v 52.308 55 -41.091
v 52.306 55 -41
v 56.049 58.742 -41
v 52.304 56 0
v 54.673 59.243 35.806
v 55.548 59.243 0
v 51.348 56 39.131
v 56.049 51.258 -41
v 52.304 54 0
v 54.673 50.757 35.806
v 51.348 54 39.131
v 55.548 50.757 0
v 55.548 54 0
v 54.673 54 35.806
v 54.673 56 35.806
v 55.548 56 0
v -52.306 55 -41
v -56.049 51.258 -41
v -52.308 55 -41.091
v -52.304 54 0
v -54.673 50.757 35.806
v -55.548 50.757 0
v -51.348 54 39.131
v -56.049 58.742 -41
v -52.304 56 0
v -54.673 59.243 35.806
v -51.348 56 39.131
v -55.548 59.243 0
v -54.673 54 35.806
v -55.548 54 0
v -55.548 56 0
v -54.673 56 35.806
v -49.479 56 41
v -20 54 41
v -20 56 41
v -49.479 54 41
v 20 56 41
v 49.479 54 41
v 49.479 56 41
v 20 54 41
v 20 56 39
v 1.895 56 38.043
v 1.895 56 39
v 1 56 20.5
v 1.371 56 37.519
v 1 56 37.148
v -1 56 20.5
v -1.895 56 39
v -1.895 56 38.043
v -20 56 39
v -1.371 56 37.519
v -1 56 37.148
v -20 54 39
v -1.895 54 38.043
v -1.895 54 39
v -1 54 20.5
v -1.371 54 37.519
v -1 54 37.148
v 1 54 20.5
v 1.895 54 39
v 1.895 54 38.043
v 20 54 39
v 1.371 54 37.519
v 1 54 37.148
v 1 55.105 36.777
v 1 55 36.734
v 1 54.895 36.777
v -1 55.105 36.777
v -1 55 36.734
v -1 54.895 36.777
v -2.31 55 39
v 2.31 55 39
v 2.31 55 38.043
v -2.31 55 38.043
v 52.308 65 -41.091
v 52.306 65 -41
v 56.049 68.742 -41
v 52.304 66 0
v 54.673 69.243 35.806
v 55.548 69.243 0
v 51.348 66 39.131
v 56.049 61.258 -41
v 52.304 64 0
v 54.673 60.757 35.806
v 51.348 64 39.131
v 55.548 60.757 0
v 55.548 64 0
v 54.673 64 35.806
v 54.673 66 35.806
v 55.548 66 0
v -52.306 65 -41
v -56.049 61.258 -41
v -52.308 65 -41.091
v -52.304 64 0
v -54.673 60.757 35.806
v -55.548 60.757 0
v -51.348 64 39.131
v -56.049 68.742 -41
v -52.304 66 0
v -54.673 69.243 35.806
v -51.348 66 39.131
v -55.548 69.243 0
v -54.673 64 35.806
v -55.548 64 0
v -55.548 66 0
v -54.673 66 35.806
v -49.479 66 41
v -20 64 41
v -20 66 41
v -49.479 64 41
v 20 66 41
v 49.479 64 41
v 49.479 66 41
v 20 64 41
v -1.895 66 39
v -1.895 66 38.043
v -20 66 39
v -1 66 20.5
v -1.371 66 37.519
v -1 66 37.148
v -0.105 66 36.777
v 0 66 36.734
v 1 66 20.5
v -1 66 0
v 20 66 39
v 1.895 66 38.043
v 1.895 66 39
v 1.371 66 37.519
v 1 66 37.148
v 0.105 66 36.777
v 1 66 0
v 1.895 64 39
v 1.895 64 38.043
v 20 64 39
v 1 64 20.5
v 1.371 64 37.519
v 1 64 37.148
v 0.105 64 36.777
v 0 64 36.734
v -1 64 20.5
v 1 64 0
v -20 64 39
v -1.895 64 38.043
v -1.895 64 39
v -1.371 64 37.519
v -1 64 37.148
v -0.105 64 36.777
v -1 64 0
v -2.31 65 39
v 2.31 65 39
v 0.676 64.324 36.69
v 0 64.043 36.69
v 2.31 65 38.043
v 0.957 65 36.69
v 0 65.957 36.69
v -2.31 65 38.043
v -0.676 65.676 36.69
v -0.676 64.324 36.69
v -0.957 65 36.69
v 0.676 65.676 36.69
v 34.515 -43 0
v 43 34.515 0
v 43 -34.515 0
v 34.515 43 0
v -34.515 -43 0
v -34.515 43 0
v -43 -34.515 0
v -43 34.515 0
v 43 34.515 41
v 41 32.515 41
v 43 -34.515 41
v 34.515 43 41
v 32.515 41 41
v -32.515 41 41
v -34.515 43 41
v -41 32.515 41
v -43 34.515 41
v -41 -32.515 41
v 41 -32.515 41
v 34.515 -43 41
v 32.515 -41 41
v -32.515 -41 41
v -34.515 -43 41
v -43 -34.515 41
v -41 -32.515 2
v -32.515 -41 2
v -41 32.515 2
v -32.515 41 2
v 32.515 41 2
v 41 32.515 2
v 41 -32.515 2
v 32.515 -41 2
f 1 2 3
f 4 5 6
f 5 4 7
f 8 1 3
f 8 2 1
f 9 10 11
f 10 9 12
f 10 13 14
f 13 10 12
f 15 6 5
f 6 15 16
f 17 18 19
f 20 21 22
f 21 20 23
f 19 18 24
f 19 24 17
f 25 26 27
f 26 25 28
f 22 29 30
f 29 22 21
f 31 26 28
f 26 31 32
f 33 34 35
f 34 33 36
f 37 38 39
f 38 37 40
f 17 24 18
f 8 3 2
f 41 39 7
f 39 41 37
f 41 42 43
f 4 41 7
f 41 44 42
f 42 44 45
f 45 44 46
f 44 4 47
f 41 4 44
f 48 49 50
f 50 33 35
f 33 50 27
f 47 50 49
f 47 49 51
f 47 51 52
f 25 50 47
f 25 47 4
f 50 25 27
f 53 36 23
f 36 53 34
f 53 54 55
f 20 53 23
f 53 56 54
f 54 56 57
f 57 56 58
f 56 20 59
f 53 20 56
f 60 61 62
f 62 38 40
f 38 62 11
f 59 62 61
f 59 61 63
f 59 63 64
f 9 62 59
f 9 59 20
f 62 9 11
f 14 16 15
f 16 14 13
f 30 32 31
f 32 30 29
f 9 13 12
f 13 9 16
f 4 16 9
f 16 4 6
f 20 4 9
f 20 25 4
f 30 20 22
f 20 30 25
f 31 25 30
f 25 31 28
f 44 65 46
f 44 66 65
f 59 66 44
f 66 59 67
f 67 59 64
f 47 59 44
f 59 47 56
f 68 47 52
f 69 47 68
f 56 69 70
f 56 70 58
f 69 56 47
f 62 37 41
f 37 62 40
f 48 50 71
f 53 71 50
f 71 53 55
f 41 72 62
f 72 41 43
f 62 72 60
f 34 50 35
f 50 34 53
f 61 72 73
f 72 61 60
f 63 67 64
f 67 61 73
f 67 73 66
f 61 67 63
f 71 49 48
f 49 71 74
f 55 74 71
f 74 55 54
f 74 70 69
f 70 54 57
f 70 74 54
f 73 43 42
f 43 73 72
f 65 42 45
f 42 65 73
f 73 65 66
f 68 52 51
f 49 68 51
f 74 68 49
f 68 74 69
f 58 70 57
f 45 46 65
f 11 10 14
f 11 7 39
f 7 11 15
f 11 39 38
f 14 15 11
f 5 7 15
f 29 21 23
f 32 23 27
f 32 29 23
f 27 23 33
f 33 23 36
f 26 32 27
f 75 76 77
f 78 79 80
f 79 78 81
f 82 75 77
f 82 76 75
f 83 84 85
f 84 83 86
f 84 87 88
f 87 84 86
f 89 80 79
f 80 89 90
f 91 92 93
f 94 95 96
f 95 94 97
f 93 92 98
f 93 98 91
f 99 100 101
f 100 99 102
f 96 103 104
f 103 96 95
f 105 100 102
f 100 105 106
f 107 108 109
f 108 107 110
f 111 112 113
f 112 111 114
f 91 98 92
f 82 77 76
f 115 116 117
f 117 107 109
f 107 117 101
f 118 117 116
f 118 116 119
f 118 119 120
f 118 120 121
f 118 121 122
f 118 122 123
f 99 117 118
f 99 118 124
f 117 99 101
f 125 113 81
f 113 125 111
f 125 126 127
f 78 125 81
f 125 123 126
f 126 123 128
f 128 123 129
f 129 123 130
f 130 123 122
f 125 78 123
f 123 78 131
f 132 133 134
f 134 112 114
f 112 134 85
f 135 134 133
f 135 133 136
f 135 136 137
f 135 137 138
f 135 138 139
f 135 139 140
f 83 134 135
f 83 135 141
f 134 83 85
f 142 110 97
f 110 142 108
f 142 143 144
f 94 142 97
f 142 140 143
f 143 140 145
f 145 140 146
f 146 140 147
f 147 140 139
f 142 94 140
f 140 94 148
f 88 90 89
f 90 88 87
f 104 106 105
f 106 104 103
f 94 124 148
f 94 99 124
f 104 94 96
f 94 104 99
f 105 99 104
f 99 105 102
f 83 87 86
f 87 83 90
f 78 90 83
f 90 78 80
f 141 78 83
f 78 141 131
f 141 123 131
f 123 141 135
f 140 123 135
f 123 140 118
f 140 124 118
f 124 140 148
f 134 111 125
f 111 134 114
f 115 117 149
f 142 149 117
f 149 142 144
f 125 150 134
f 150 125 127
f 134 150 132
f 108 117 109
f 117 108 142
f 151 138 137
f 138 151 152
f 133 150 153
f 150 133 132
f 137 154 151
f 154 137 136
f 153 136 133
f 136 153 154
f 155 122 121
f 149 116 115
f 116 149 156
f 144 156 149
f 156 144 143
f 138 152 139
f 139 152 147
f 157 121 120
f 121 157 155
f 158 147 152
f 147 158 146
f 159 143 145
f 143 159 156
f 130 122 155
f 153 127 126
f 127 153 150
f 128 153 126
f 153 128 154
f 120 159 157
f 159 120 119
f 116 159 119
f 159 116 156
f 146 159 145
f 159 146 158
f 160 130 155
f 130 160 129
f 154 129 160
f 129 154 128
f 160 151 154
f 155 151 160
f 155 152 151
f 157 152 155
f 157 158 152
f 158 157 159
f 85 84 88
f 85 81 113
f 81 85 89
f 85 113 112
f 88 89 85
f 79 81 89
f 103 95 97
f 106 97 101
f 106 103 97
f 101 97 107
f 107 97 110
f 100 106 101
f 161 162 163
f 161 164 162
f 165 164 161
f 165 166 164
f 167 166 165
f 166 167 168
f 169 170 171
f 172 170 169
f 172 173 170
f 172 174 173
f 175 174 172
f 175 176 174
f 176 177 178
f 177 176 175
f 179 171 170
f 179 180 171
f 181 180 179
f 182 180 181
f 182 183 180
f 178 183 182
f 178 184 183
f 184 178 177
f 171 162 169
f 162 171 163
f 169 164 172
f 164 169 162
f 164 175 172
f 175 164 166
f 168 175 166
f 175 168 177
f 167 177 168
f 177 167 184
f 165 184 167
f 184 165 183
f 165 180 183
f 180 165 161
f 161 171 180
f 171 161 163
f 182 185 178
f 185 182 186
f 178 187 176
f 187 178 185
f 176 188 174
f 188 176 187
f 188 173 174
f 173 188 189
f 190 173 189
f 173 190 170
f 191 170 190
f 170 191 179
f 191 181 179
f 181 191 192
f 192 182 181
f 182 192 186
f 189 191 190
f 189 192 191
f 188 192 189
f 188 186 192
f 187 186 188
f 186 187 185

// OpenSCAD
// file: regular-square-bin.scad
// The length of the individual bin/tray.
$length = 86;

// The depth (width really) of the bin/tray.
$depth = 86;

// The height as a percentage of the total available depth of the bin it will be inserted into.
$heightPct = 50; // [20:100]

// The thickness of the outter walls.
$wallThickness = 2; // [2:10]

// The thickness of the bottom.
$bottomThickness = 2; // [2:10]

// The chamfer size on the left side of the box.
$leftChamfer = 12; // [0:14]

// The chamfer size on the right side of the box.
$rightChamfer = 12; // [0:14]

{} // Below this are not customizable parameters

generateTrayPct($length, $depth, $heightPct, $wallThickness, $bottomThickness, $leftChamfer, $rightChamfer);

module generateTrayPct(length, depth, heightPct, wallThickness, bottomThickness, leftChamfer, rightChamfer) {
    $height = 82 * heightPct * 0.01;
    generateTray(length, depth, $height, wallThickness, bottomThickness, leftChamfer, rightChamfer);
}

module generateTray(length, depth, height, wallThickness, bottomThickness, leftChamfer, rightChamfer) {
    $leftChamferTriangleSide = sqrt(pow(leftChamfer,2)/2);
    $rightChamferTriangleSide = sqrt(pow(rightChamfer,2)/2);

    // Outer polygon
    outer_points = [
        [$leftChamferTriangleSide,0], 
        [length-$rightChamferTriangleSide,0], 
        [length, $rightChamferTriangleSide],
        [length, depth-$rightChamferTriangleSide],
        [length - $rightChamferTriangleSide, depth],
        [$leftChamferTriangleSide,depth],
        [0,depth-$leftChamferTriangleSide],
        [0, $leftChamferTriangleSide]
    ];

    // Inner polygon
    inner_points = [
        [$leftChamferTriangleSide + wallThickness, wallThickness], 
        [length - $rightChamferTriangleSide - wallThickness, wallThickness], 
        [length - wallThickness, $rightChamferTriangleSide + wallThickness],
        [length - wallThickness, depth - $rightChamferTriangleSide - wallThickness],
        [length - $rightChamferTriangleSide - wallThickness, depth - wallThickness],
        [$leftChamferTriangleSide + wallThickness, depth - wallThickness],
        [wallThickness, depth - $leftChamferTriangleSide - wallThickness],
        [wallThickness, $leftChamferTriangleSide + wallThickness]
    ];

    // Create the hollow shape and extrude it
    color("green")
    linear_extrude(height = height)
    difference() {
            polygon(points = outer_points);
            polygon(points = inner_points);
    }

    // Add a solid base
    color("red")
    linear_extrude(height = bottomThickness)
    polygon(points = outer_points);
}
// file: regular-square-divider.scad
// Length of the Divider ... Regular 4" Square, X-Style: 113mm was a tad loose, 114mm was too tight, 113.5 fits but is a tad tight.
$lengthAtTop = 113.25;

// Thickness of the Divider
$thickness = 2; // [2:10]

// The proportion of the total height to use for scaling.
$heightPercentage = 100; // [10:100]

// Width of the Divider Edge
$widthOfDividerEdge = 6; // [6:10]

// The Length of the Chamfer
$chamferLength = 10; // [6:14]

// Cutout Location for connecting dividers together
$cutOutLocation = 1; // [1:Bottom, -1:Top, 0:None]

// Width of the notch at the bottom of the divider
$bottomNotchWidth = 40; // [25:50]
    
{} // All Parameters Above

// Object Generation
/////////////////////////////////////////////////
GenerateDivider($lengthAtTop, $thickness, $heightPercentage, $widthOfDividerEdge, $chamferLength, $cutOutLocation, $bottomNotchWidth);

// Generate the Divider
/////////////////////////////////////////////////
module GenerateDivider(lengthAtTop, thickness, heightPercentage, widthOfDividerEdge, chamferLength, cutOutLocation, bottomNotchWidth) {

    // THe Height of the Divider
    $height = 82;

    // The height (or depth) of the notch at the bottom of the divider
    $bottomNotchHeight = 2; // [0:10]

    // Angle of the Container Sides
    $complementAngle = 1.4;
    $angle = 90 - $complementAngle;

    difference() {
        IsoTrapezoid(lengthAtTop, $height, $angle, thickness, widthOfDividerEdge);
        
        $heightProportion = heightPercentage * .01;
        
        $precentageToRemove = (1 - $heightProportion);
        
        // Cut from the Top Down
        $amountToRemoveFromTop = $height * $precentageToRemove;
        $topEdgeFromCenter = -$height / 2;
        translate([0, 0, $topEdgeFromCenter + $amountToRemoveFromTop / 2]) cube([lengthAtTop, widthOfDividerEdge * 2, $amountToRemoveFromTop], center = true);
        
        // Cutouts For Divider
        if (cutOutLocation != 0) {
            $cutOutHeight = ($height * $heightProportion) / 2;

            $bottomOfDividerFromCenter =  $height / 2;

            $zOffSetForCutout = ($bottomOfDividerFromCenter - ($cutOutHeight / 2));
            
            if(cutOutLocation == -1){
                translate([0,0, $zOffSetForCutout - $cutOutHeight])
                #cube([thickness, thickness*1.1, $cutOutHeight], center = true);
            }
            else{
                translate([0,0, $zOffSetForCutout])
                #cube([thickness, thickness*1.1, $cutOutHeight], center = true);
            }
        }
        
        // Cutouts For Divider
        //if (cutOutLocation == -1) {
         //   $cutOutHeight = ($height * $heightProportion) / 2;

         //   $bottomOfDividerFromCenter =  $height / 2;

          //  $zOffSetForCutout = ($bottomOfDividerFromCenter - ($cutOutHeight / 2));

          //  #translate([0,0, $zOffSetForCutout - $cutOutHeight])
          //      cube([thickness, thickness*1.1, $cutOutHeight], center = true);
        //}
        

        
        // Notch at bottom
        translate([0,0,(($height)/2)-($bottomNotchHeight/2)])
            cube([bottomNotchWidth, thickness*1.1, $bottomNotchHeight], center = true);
        
        // Notch for the small sphere often in the bottom of the containers
        translate([0,0,($height/2)-$bottomNotchHeight])
            sphere(d = 5);

        // Cutoffs needed for the Chamfers in the corners
        $overcutFactor = 2;
        $zHeightOfChamfer = ($height/2);
        translate([(lengthAtTop / 2), 0,$zHeightOfChamfer])
            rotate([45,0,90])
            cube([widthOfDividerEdge * $overcutFactor,  chamferLength,  chamferLength], center = true);
        
        
        translate([-(lengthAtTop / 2), 0,$zHeightOfChamfer])
            rotate([45,0,90])
            cube([widthOfDividerEdge * $overcutFactor,  chamferLength,  chamferLength], center = true);
    }
}

// Generate an Trapezoid with a tapered angle
/////////////////////////////////////////////////
module IsoTrapezoid(longEdge, height, angle, thickness, widthOfDividerEdge){
    $baseOfTriangle = height / tan(angle);
    
    cube([longEdge - ($baseOfTriangle * 2), thickness, height], center = true);

    // Render the triangle with specified angle and height
    color("red")
        translate([(longEdge/2),-thickness/2,-(height/2)])
        rotate([90,0,180])
        triangle(angle, height, thickness);

    color("blue")
        translate([-(longEdge/2),thickness/2,-(height/2)])
        rotate([90,0,0])
        triangle(angle, height, thickness);

    $halfChamferOffSet = ($height / tan($angle))/2;
    
    translate([(longEdge/2)-$halfChamferOffSet,0,0])
        rotate([$complementAngle, 0, -90])
        triangle2(widthOfDividerEdge, height);

    translate([-(longEdge/2)+$halfChamferOffSet,0,0])
        rotate([$complementAngle, 0, 90])
        triangle2(widthOfDividerEdge, height);
}

// Create the triangle module with angle and height as arguments
/////////////////////////////////////////////////
module triangle(angle, height, thickness) {
    // Calculate the base length based on the angle and height
    base_length = height / tan(angle);

    linear_extrude(thickness)
    // Create the triangle
    polygon(points=[
        [0, 0], // First vertex
        [base_length, 0], // Second vertex
        [base_length, height] // Third vertex
    ]);
}

// Create a right triangle
/////////////////////////////////////////////////
module triangle2(sizeOfBase,length){
    difference(){   
        rotate([0,0,45]){
            cube([sizeOfBase,sizeOfBase,length], center = true);
        }
        
        translate([0,sizeOfBase/2,0]){
            cube([sizeOfBase*1.5,sizeOfBase,length*1.1], center = true);
        }
    }
}
// main file
use <regular-square-divider.scad>
use <regular-square-bin.scad>

// The length of the individual bin/tray.
$binLength = 86;

// The depth (width really) of the bin/tray.
$binDepth = 86;

// The height as a percentage of the total available depth of the bin it will be inserted into.
$binHeightPct = 50; // [20:100]

// The thickness of the outter walls.
$binWallThickness = 2; // [2:10]

// The thickness of the bottom.
$binBottomThickness = 2; // [2:10]

// The chamfer size on the left side of the box.
$binLeftChamfer = 12; // [0:14]

// The chamfer size on the right side of the box.
$binRightChamfer = 12; // [0:14]

// Length of the Divider ... Regular 4" Square, X-Style: 113mm was a tad loose, 114mm was too tight, 113.5 fits but is a tad tight.
$dividerLengthAtTop = 113.1;

// Thickness of the Divider
$dividerThickness = 2; // [2:10]

// The proportion of the total height to use for scaling.
$dividerHeightPercentage = 50; // [10:100]

// Width of the Divider Edge
$dividerWidthOfDividerEdge = 6; // [6:10]

// The Length of the Chamfer
$chamferLength = 10; // [6:14]

{} // Below this are not customizable parameters

// Divider 1
translate([0, $binLength/2 + $dividerWidthOfDividerEdge * 2, 0])
GenerateDivider($dividerLengthAtTop, $dividerThickness, $dividerHeightPercentage, $dividerWidthOfDividerEdge, $chamferLength, 1, 40);

// Divider 2
translate([0, $binLength/2 + $dividerWidthOfDividerEdge * 2 + 10, 0])
GenerateDivider($dividerLengthAtTop, $dividerThickness, $dividerHeightPercentage, $dividerWidthOfDividerEdge, $chamferLength, -1, 40);



translate([-$binLength/2,-$binDepth/2,0])
generateTrayPct($binLength, $binDepth, $binHeightPct, $binWallThickness, $binBottomThickness, $binLeftChamfer, $binRightChamfer);
